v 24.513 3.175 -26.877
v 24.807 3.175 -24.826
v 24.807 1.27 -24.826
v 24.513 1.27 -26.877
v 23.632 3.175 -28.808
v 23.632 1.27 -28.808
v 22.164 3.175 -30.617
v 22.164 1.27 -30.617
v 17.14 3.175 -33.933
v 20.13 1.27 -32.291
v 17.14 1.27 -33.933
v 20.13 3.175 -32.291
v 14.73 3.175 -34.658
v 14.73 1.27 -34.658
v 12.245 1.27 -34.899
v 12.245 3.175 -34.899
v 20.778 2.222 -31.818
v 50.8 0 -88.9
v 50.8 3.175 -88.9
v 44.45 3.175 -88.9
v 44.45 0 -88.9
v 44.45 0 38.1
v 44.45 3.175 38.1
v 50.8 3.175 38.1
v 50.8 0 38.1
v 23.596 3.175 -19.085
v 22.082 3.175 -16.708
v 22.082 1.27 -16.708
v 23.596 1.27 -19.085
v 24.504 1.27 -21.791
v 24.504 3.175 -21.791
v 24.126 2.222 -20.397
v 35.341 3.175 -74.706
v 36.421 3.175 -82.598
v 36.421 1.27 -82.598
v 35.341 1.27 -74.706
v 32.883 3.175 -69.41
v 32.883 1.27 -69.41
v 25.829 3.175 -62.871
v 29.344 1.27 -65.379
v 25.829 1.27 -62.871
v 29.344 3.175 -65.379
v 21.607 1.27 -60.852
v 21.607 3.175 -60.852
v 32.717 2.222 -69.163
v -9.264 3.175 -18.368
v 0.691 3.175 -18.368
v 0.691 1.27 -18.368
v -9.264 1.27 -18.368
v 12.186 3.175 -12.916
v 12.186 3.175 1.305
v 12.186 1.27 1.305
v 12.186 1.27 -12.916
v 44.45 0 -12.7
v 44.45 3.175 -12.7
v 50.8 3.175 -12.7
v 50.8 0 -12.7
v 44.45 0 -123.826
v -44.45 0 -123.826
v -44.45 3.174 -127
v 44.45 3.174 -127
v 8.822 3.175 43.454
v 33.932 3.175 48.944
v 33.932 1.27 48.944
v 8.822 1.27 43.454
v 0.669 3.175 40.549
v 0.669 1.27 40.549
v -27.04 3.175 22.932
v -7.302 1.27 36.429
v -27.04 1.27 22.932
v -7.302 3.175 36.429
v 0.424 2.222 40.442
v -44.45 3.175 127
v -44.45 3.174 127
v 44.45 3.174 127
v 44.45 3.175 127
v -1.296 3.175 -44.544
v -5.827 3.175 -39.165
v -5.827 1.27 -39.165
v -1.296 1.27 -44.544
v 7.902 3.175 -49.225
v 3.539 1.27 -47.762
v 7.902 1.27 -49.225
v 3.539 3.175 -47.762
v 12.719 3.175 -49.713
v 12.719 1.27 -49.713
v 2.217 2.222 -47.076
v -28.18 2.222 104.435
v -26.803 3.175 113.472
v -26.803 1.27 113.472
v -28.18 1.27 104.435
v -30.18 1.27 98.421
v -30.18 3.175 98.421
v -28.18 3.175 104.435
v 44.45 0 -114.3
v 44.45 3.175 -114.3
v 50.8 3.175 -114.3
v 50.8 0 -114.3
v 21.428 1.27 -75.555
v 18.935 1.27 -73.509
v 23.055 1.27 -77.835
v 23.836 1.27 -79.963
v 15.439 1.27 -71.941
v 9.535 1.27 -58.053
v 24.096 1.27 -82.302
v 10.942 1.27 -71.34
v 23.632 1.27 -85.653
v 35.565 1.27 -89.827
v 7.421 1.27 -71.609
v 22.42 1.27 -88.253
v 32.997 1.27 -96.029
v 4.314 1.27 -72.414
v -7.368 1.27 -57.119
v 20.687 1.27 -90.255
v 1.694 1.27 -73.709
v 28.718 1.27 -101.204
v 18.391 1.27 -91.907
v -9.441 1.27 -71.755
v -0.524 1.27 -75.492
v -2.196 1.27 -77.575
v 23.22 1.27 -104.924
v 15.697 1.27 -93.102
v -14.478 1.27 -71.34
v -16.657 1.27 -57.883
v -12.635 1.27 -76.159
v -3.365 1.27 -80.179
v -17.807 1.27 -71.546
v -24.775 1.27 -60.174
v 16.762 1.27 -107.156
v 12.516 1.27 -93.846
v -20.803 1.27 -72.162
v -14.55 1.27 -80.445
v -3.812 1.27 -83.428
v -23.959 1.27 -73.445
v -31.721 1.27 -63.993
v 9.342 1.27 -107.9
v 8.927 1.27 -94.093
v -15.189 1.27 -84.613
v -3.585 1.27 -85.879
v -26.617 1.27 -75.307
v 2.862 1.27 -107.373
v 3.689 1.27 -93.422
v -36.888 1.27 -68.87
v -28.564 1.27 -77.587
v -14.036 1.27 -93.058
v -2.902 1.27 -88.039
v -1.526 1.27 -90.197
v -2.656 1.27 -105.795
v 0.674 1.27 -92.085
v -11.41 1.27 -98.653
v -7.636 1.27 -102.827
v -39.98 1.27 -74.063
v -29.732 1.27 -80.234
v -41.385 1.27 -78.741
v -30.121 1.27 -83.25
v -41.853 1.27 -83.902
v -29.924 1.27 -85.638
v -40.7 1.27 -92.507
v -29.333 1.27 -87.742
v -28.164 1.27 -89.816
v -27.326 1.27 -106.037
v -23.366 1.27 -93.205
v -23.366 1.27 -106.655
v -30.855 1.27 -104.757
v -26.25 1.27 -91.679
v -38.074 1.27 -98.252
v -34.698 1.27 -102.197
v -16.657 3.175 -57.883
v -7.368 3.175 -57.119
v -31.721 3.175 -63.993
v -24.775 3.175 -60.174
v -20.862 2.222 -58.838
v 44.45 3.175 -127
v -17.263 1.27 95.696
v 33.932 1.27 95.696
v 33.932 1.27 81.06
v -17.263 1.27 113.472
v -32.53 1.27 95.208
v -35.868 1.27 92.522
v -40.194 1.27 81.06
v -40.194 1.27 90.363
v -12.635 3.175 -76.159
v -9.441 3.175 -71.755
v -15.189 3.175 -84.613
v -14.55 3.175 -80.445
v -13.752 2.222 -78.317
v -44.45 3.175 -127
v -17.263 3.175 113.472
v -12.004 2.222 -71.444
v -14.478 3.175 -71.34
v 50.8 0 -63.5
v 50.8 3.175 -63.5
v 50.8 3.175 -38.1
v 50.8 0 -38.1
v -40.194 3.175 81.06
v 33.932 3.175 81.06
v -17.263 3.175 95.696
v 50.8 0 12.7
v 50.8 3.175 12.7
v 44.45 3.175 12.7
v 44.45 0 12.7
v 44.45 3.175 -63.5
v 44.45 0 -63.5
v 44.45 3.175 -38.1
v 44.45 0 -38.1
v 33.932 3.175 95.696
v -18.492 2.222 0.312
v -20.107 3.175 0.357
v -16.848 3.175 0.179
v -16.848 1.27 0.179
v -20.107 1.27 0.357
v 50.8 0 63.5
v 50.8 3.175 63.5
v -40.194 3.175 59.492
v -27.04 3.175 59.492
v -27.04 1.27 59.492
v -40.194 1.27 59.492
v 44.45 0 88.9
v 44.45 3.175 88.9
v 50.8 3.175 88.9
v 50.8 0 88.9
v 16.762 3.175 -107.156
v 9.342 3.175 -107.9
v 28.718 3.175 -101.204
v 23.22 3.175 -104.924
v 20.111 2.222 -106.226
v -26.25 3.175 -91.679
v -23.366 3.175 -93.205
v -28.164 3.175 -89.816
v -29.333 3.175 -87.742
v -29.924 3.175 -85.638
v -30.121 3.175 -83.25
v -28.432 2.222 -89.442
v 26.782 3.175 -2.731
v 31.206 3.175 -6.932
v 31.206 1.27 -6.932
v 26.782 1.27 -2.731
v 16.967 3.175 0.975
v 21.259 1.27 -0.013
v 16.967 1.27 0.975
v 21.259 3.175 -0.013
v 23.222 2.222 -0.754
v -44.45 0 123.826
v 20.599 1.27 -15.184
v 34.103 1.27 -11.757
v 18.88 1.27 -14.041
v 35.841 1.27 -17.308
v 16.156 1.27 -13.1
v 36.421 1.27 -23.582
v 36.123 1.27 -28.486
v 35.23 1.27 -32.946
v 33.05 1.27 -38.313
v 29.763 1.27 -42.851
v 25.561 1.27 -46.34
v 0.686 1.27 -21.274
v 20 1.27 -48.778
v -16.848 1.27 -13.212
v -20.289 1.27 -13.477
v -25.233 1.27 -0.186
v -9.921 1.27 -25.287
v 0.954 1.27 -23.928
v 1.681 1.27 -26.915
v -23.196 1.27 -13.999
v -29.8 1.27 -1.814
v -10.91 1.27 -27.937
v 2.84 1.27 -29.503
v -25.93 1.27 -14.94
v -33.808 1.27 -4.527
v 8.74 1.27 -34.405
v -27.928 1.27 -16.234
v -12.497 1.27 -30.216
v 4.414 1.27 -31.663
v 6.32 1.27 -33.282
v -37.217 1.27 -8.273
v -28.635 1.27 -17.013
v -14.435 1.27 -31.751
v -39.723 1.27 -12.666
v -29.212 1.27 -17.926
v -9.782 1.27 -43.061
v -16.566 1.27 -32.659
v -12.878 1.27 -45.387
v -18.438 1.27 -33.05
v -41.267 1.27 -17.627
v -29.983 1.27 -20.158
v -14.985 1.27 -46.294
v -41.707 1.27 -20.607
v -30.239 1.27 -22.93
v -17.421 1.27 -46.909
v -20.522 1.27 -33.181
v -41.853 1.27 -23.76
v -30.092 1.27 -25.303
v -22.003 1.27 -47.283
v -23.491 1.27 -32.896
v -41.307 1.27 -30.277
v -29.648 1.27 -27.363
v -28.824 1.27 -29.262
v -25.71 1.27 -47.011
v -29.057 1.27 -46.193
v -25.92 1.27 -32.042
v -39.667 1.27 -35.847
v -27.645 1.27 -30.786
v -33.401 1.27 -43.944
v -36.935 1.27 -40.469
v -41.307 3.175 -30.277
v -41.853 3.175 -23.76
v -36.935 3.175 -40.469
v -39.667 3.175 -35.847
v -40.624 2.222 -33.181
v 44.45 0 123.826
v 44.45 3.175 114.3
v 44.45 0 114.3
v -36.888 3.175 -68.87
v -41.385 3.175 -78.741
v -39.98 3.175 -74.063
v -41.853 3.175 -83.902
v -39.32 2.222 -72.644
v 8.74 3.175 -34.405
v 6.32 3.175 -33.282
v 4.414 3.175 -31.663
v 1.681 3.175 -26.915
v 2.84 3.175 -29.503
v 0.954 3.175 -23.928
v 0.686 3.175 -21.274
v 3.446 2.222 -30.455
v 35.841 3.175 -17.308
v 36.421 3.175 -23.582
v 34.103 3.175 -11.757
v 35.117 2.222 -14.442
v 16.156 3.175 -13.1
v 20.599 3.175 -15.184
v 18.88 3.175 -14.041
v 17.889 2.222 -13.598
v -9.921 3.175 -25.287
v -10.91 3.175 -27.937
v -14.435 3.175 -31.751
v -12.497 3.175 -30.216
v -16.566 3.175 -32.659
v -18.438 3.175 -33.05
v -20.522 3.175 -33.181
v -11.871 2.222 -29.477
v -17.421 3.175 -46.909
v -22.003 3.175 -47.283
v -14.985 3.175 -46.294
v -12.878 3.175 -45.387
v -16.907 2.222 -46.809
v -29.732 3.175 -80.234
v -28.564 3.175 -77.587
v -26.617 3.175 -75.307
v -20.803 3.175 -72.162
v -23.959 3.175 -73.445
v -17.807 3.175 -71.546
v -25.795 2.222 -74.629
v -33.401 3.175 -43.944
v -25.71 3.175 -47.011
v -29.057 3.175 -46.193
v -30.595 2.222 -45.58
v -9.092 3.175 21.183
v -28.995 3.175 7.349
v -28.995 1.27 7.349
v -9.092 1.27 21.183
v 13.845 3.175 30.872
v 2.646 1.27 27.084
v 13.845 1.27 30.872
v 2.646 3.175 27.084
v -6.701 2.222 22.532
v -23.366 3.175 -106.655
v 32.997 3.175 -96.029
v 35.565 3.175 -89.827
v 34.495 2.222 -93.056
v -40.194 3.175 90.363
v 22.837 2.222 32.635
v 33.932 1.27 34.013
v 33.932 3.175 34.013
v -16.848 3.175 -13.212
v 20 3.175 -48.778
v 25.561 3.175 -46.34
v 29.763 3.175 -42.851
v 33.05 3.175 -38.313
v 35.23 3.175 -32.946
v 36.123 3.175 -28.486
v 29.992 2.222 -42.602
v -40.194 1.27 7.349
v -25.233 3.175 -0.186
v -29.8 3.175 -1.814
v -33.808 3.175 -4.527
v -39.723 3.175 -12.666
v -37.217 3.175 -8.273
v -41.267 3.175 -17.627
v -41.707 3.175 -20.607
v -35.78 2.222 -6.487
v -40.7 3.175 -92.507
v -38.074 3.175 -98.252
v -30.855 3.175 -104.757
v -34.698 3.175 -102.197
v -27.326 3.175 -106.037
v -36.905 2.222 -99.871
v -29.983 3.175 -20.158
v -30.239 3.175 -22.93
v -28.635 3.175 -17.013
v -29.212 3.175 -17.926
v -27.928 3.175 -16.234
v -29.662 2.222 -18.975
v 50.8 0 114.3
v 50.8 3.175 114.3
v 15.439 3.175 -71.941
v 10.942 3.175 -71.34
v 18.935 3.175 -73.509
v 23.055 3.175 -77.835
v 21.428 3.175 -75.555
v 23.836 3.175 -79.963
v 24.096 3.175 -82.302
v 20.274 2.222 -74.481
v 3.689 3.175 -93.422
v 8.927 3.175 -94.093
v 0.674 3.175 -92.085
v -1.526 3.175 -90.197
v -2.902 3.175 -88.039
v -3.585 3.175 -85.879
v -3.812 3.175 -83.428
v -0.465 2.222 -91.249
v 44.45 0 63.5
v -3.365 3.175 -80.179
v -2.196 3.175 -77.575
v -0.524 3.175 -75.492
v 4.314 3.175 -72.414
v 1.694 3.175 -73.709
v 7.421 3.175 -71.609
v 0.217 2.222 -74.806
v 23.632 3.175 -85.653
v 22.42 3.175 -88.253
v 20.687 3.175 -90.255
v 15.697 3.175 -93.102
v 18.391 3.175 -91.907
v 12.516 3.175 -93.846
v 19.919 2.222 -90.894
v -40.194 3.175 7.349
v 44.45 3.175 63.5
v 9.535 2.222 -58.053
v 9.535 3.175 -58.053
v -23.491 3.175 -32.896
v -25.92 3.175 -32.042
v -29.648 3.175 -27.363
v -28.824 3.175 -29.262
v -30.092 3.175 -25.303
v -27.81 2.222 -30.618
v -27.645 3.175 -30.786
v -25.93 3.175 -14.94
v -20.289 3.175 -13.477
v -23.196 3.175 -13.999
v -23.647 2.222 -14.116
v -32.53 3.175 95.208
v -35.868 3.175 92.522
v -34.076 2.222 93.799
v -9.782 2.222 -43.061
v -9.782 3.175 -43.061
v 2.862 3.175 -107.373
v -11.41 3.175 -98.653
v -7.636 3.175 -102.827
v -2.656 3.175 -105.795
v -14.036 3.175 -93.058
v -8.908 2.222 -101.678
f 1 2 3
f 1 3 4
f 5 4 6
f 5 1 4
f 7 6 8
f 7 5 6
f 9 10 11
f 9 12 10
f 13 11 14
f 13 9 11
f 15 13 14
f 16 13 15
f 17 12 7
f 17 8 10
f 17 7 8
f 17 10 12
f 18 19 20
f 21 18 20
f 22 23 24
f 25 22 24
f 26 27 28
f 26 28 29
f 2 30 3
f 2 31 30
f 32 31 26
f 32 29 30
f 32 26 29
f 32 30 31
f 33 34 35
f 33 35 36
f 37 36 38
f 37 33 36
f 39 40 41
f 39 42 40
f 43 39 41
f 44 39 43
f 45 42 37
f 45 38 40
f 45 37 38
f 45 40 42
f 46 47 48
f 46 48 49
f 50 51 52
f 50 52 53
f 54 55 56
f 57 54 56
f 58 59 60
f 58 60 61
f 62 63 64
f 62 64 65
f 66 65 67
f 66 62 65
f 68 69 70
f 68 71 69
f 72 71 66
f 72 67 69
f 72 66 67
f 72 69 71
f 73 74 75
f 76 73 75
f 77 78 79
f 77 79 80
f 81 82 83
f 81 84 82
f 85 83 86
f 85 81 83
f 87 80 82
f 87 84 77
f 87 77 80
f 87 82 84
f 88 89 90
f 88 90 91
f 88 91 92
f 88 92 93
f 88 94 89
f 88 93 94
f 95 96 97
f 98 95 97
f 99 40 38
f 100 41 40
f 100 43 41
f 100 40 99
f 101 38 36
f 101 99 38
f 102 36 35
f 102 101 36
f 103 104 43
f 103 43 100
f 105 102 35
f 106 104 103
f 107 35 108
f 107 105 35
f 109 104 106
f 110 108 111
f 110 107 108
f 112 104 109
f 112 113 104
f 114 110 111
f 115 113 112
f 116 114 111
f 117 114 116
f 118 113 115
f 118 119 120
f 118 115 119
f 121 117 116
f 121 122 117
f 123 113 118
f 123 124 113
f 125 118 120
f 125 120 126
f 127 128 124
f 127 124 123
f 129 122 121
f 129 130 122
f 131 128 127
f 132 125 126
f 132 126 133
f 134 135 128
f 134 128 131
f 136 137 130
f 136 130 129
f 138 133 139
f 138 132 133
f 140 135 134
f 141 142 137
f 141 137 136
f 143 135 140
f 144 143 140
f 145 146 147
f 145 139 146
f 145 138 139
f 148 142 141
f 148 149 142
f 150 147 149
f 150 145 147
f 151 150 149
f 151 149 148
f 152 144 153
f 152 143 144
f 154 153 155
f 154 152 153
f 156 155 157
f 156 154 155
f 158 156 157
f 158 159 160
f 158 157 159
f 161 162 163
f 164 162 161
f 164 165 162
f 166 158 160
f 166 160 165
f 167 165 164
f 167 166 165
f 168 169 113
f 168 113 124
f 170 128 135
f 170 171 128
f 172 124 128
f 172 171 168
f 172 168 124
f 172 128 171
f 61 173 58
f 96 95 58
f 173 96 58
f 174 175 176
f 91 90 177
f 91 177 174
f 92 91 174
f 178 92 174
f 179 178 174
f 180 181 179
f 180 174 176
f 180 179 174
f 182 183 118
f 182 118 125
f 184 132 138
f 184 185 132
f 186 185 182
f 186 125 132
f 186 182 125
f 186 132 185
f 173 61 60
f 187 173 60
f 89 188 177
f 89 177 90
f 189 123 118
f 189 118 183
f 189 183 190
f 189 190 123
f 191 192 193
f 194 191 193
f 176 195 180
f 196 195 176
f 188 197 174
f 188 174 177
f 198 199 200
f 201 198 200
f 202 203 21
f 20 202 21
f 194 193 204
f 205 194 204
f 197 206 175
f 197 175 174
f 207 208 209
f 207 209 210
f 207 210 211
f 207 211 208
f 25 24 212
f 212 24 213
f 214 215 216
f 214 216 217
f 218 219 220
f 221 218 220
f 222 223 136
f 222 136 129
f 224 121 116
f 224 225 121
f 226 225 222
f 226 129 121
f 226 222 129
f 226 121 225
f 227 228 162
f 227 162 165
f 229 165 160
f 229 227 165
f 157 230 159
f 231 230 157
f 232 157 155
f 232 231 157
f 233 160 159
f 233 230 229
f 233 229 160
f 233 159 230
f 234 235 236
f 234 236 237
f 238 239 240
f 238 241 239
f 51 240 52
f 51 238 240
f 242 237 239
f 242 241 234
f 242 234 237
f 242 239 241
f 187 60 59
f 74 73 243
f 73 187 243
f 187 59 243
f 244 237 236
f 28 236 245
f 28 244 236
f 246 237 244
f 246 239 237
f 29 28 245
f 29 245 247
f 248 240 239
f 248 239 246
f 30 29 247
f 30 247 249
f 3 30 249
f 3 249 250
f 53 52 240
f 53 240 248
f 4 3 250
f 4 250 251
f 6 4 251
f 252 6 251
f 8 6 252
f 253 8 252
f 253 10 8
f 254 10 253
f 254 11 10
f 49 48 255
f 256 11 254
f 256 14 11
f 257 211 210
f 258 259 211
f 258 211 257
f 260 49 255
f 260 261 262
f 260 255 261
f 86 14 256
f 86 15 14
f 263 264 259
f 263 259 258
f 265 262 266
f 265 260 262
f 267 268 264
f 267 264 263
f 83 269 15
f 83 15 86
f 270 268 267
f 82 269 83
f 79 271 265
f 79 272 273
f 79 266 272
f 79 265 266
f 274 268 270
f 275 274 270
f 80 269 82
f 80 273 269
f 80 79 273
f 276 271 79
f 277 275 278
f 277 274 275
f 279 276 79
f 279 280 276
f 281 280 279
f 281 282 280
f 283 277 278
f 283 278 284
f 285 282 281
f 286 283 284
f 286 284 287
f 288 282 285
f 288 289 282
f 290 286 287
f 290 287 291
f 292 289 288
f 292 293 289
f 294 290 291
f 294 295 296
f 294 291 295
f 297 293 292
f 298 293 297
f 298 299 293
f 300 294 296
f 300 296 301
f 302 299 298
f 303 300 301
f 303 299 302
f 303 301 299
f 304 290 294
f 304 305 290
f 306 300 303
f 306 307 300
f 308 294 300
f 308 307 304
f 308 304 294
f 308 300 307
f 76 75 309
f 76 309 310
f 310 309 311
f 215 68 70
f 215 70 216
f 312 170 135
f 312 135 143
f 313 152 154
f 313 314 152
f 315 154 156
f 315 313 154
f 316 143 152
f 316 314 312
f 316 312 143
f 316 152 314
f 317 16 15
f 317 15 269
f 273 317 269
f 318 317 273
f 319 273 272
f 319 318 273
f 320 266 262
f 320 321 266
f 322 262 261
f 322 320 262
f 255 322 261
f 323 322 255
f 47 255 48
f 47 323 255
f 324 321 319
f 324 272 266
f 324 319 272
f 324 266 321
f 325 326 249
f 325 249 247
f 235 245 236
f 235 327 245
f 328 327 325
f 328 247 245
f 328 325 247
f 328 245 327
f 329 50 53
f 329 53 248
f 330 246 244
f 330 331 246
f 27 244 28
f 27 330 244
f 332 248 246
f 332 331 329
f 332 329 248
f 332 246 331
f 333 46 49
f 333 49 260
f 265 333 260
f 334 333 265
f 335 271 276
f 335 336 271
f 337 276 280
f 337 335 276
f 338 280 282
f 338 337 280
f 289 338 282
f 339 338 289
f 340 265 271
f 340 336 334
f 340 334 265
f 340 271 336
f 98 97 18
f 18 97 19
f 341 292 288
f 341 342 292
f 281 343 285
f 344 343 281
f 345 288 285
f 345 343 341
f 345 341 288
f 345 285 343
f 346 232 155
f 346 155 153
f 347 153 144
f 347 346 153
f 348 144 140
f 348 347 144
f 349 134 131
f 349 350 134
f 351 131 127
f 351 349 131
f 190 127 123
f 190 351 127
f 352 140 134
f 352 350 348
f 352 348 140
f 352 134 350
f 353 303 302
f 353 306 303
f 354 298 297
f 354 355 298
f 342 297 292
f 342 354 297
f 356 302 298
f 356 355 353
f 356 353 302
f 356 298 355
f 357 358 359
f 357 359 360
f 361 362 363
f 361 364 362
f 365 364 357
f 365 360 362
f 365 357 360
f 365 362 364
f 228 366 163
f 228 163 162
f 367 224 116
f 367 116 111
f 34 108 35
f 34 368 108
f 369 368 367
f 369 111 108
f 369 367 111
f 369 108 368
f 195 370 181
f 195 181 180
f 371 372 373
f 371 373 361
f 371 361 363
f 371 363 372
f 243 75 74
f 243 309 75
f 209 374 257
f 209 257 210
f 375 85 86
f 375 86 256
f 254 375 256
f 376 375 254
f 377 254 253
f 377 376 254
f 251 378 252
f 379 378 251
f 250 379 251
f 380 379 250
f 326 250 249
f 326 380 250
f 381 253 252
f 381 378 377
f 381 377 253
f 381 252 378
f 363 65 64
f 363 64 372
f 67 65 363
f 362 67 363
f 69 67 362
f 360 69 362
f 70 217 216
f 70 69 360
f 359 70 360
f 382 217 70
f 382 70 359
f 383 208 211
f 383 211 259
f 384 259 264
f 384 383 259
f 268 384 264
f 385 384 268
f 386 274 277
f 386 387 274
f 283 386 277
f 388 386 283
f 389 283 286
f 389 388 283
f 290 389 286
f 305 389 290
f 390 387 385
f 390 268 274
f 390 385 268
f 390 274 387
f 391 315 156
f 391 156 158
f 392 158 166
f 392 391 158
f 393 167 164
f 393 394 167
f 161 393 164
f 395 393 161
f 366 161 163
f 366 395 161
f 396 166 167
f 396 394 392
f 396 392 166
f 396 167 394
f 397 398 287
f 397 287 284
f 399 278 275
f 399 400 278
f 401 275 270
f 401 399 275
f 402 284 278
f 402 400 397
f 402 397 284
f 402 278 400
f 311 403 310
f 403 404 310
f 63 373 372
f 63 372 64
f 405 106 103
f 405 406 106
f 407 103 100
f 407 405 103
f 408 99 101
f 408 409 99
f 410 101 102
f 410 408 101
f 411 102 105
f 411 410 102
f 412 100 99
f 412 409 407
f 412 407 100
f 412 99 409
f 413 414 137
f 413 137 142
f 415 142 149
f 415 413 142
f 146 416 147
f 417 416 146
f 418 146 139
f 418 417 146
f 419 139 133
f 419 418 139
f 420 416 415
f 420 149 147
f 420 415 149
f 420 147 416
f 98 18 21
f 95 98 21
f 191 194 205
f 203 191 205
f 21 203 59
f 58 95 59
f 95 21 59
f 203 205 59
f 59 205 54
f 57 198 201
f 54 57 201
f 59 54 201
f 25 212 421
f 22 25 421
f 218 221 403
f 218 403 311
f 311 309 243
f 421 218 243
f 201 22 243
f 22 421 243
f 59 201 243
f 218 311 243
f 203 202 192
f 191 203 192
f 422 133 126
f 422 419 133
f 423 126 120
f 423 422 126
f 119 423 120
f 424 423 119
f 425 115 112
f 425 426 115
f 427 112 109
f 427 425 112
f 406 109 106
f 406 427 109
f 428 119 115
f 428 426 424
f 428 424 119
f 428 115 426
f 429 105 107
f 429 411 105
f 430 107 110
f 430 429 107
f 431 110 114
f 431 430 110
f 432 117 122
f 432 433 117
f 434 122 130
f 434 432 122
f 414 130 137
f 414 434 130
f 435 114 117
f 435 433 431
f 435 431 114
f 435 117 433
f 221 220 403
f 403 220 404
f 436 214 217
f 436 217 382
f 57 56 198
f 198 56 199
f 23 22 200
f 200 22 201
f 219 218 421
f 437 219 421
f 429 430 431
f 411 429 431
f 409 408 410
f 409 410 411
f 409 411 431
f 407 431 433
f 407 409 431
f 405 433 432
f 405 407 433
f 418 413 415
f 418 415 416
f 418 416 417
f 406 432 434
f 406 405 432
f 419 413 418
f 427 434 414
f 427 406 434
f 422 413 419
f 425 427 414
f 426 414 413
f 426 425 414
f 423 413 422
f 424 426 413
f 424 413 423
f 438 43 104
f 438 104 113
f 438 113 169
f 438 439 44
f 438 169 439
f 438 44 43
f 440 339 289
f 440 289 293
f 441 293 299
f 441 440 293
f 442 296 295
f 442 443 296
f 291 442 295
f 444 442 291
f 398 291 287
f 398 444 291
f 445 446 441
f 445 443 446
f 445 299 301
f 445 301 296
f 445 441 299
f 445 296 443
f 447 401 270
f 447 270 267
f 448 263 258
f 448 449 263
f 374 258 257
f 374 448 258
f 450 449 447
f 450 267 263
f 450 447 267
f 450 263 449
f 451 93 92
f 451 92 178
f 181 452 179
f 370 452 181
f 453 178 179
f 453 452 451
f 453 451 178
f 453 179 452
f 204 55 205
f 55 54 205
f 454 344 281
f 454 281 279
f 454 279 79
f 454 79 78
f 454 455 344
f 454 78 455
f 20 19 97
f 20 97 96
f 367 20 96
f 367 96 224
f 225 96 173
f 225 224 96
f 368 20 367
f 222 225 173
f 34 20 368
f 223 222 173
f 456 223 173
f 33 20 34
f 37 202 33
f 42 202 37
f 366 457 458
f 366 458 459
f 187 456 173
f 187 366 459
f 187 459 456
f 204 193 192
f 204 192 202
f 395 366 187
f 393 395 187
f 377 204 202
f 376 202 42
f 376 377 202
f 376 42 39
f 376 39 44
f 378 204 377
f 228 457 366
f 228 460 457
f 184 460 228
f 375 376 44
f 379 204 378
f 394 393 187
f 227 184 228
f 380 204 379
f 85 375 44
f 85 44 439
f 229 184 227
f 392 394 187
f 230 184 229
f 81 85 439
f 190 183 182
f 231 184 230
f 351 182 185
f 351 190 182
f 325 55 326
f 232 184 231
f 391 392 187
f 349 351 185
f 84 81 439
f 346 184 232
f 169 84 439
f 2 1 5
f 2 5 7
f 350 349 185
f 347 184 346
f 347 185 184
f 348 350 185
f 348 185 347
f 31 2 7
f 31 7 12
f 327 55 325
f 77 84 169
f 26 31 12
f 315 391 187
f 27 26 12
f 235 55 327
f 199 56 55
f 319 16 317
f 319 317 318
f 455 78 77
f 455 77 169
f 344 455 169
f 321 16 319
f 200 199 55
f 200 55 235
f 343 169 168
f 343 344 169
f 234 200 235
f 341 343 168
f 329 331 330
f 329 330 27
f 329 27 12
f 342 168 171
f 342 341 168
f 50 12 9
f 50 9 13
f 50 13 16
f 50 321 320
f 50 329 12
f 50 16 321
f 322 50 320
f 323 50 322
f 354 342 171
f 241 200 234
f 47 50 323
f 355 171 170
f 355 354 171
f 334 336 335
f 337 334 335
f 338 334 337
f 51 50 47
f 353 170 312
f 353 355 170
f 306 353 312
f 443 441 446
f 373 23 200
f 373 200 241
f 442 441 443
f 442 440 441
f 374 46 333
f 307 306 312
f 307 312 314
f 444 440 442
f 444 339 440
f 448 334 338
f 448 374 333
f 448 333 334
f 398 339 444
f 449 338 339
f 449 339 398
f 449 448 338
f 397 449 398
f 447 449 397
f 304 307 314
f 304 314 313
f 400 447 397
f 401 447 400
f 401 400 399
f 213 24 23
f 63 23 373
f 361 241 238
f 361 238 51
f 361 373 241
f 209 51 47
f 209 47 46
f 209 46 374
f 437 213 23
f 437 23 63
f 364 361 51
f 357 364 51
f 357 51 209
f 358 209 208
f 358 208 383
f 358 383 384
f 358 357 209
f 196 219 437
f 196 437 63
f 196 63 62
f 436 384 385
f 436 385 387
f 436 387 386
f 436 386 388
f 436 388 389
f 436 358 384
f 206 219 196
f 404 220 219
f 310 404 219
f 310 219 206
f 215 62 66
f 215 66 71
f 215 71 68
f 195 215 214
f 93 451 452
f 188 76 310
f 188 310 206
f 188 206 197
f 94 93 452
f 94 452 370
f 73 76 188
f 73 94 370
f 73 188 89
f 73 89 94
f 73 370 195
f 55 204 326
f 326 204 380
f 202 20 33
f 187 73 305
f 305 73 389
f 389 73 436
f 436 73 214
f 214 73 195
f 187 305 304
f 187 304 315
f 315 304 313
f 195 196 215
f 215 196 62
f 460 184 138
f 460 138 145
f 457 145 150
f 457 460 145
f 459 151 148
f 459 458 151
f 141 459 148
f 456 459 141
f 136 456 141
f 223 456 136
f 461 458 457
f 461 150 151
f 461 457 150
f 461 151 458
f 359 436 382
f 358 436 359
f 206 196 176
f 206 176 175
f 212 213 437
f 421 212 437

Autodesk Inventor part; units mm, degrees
ref_plane "YZ Plane" through (0, 0, 0) normal (1, 0, 0) x (0, 1, 0)
ref_plane "XZ Plane" through (0, 0, 0) normal (0, 1, 0) x (-1, 0, 0)
ref_plane "XY Plane" through (0, 0, 0) normal (0, 0, 1) x (1, 0, 0)
sketch "Sketch1" plane through (0, 0, 0) normal (0, 1, 0) x (-1, 0, 0)
  line L0 (44.45, 127) -> (-44.45, 127)
  line L1 (-44.45, 127) -> (-44.45, -127)
  line L2 (-44.45, -127) -> (44.45, -127)
  line L3 (44.45, -127) -> (44.45, 127)
  point P0 (0, 0)
  dimension "d0" = 88.9
  dimension "d1" = 254
extrude "Extrusion1" add sketch "Sketch1" along normal blind 3.175
sketch "Sketch3" plane through (0, 3.175, 0) normal (0, 1, 0) x (1, 0, 0)
  line L0 (50.8, -114.3) -> (44.45, -114.3)
  line L1 (44.45, -114.3) -> (44.45, -88.9)
  line L2 (44.45, -88.9) -> (50.8, -88.9)
  line L3 (50.8, -88.9) -> (50.8, -114.3)
  line L4 (50.8, -63.5) -> (44.45, -63.5)
  line L5 (44.45, -63.5) -> (44.45, -38.1)
  line L6 (44.45, -38.1) -> (50.8, -38.1)
  line L7 (50.8, -38.1) -> (50.8, -63.5)
  line L8 (50.8, -12.7) -> (44.45, -12.7)
  line L9 (44.45, -12.7) -> (44.45, 12.7)
  line L10 (44.45, 12.7) -> (50.8, 12.7)
  line L11 (50.8, 12.7) -> (50.8, -12.7)
  line L12 (50.8, 38.1) -> (44.45, 38.1)
  line L13 (44.45, 38.1) -> (44.45, 63.5)
  line L14 (44.45, 63.5) -> (50.8, 63.5)
  line L15 (50.8, 63.5) -> (50.8, 38.1)
  line L16 (50.8, 88.9) -> (44.45, 88.9)
  line L17 (44.45, 88.9) -> (44.45, 114.3)
  line L18 (44.45, 114.3) -> (50.8, 114.3)
  line L19 (50.8, 114.3) -> (50.8, 88.9)
  point P0 (0, 0)
  dimension "d6" = 50.8
extrude "Extrusion2" add sketch "Sketch3" against normal blind 3.175
sketch "Sketch4" plane through (44.042, 3.175, 128.8813) normal (0, 1, 0) x (0, 0, -1)
  line L0 (8.2401, 85.8951) -> (239.8135, 85.8951) construction
  line L1 (239.8135, 85.8951) -> (239.8135, 3.5919) construction
  line L2 (239.8135, 3.5919) -> (8.2401, 3.5919) construction
  line L3 (8.2401, 3.5919) -> (8.2401, 85.8951) construction
  line L4 (47.8214, 10.1099) -> (33.1858, 10.1099)
  line L5 (33.1858, 10.1099) -> (33.1858, 61.3049)
  line L6 (33.1858, 61.3049) -> (15.4097, 61.3049)
  line L7 (15.4097, 61.3049) -> (15.4097, 70.8447)
  spline S0 degree 2 poles (15.4097, 70.8447) (25.9569, 71.9112) (30.4601, 74.2221) knots 0 0 0 1 1 1
  spline S1 degree 2 poles (30.4601, 74.2221) (35.6744, 77.007) (38.5186, 84.236) knots 0 0 0 1 1 1
  line L8 (38.5186, 84.236) -> (47.8214, 84.236)
  line L9 (47.8214, 84.236) -> (47.8214, 10.1099)
  spline S2 degree 2 poles (121.5327, 73.0371) (102.9271, 49.8689) (98.0091, 30.1968) knots 0 0 0 1 1 1
  spline S3 degree 2 poles (98.0091, 30.1968) (96.0537, 22.2568) (94.8687, 10.1099) knots 0 0 0 1 1 1
  line L10 (94.8687, 10.1099) -> (79.9368, 10.1099)
  spline S4 degree 2 poles (79.9368, 10.1099) (83.7883, 33.1002) (93.0911, 54.1352) (105.9491, 71.0817) knots 0 0 0 1 2 2 2
  line L11 (105.9491, 71.0817) -> (69.3897, 71.0817)
  line L12 (69.3897, 71.0817) -> (69.3897, 84.236)
  line L13 (69.3897, 84.236) -> (121.5327, 84.236)
  line L14 (121.5327, 84.236) -> (121.5327, 73.0371)
  spline S5 degree 2 poles (178.5939, 31.3226) (178.5939, 20.4792) (164.373, 7.6212) (152.4631, 7.6212) knots 0 0 0 1 2 2 2
  spline S6 degree 2 poles (152.4631, 7.6212) (142.5085, 7.6212) (135.8128, 12.8355) knots 0 0 0 1 1 1
  spline S7 degree 2 poles (135.8128, 12.8355) (127.5766, 19.2941) (127.5766, 31.8559) knots 0 0 0 1 1 1
  line L15 (127.5766, 31.8559) -> (141.7974, 31.8559)
  spline S8 degree 2 poles (141.7974, 31.8559) (141.2642, 25.3973) (145.5897, 21.9605) knots 0 0 0 1 1 1
  spline S9 degree 2 poles (145.5897, 21.9605) (148.9079, 19.2349) (153.7074, 19.2349) knots 0 0 0 1 1 1
  spline S10 degree 2 poles (153.7074, 19.2349) (157.6181, 19.2349) (163.7805, 27.2934) (163.7805, 31.7966) knots 0 0 0 1 2 2 2
  spline S11 degree 2 poles (163.7805, 31.7966) (163.7805, 37.485) (154.8925, 43.7066) (147.2488, 43.3511) knots 0 0 0 1 2 2 2
  line L16 (147.2488, 43.3511) -> (147.2488, 53.3057)
  spline S12 degree 2 poles (147.2488, 53.3057) (162.0621, 52.8909) (162.0621, 64.5638) knots 0 0 0 1 1 1
  spline S13 degree 2 poles (162.0621, 64.5638) (162.0621, 74.2814) (151.8113, 74.2814) knots 0 0 0 1 1 1
  spline S14 degree 2 poles (151.8113, 74.2814) (147.2488, 74.2814) (145.1156, 71.9705) knots 0 0 0 1 1 1
  spline S15 degree 2 poles (145.1156, 71.9705) (142.39, 68.9486) (142.0937, 60.8901) knots 0 0 0 1 1 1
  line L17 (142.0937, 60.8901) -> (128.7024, 60.8901)
  spline S16 degree 2 poles (128.7024, 60.8901) (128.5247, 62.5492) (128.5247, 64.149) knots 0 0 0 1 1 1
  spline S17 degree 2 poles (128.5247, 64.149) (128.5247, 73.7481) (142.2122, 85.8951) (152.6408, 85.8951) knots 0 0 0 1 2 2 2
  spline S18 degree 2 poles (152.6408, 85.8951) (163.1287, 85.8951) (169.3503, 80.977) knots 0 0 0 1 1 1
  spline S19 degree 2 poles (169.3503, 80.977) (176.1645, 75.7627) (176.1645, 66.0452) knots 0 0 0 1 1 1
  spline S20 degree 2 poles (176.1645, 66.0452) (176.1645, 60.4161) (174.2684, 56.9201) knots 0 0 0 1 1 1
  spline S21 degree 2 poles (174.2684, 56.9201) (172.7278, 54.2537) (168.0467, 49.8689) knots 0 0 0 1 1 1
  spline S22 degree 2 poles (168.0467, 49.8689) (178.5939, 43.0548) (178.5939, 31.3226) knots 0 0 0 1 1 1
  spline S23 degree 2 poles (236.7808, 34.7001) (236.7808, 22.8494) (230.0852, 15.3242) knots 0 0 0 1 1 1
  spline S24 degree 2 poles (230.0852, 15.3242) (223.0932, 7.6212) (211.4796, 7.6212) knots 0 0 0 1 1 1
  spline S25 degree 2 poles (211.4796, 7.6212) (195.4811, 7.6212) (189.7335, 22.4346) knots 0 0 0 1 1 1
  spline S26 degree 2 poles (189.7335, 22.4346) (186.0006, 32.0929) (186.0006, 51.4095) knots 0 0 0 1 1 1
  spline S27 degree 2 poles (186.0006, 51.4095) (186.0006, 66.2229) (192.874, 75.7627) knots 0 0 0 1 1 1
  spline S28 degree 2 poles (192.874, 75.7627) (200.2214, 85.8951) (212.7831, 85.8951) knots 0 0 0 1 1 1
  spline S29 degree 2 poles (212.7831, 85.8951) (222.56, 85.8951) (234.9439, 75.9997) (235.5365, 67.408) knots 0 0 0 1 2 2 2
  line L18 (235.5365, 67.408) -> (222.0859, 67.408)
  spline S30 degree 2 poles (222.0859, 67.408) (219.538, 74.1629) (212.1313, 74.1629) knots 0 0 0 1 1 1
  spline S31 degree 2 poles (212.1313, 74.1629) (206.7985, 74.1629) (200.2214, 65.5119) (200.2214, 58.52) knots 0 0 0 1 2 2 2
  spline S32 degree 2 poles (200.2214, 58.52) (200.2214, 56.0906) (200.6362, 53.4834) knots 0 0 0 1 1 1
  spline S33 degree 2 poles (200.6362, 53.4834) (207.3318, 59.231) (213.4942, 59.231) knots 0 0 0 1 1 1
  spline S34 degree 2 poles (213.4942, 59.231) (224.3376, 59.231) (236.7808, 46.6693) (236.7808, 34.7001) knots 0 0 0 1 2 2 2
  spline S35 degree 2 poles (222.9747, 35.1148) (222.9747, 41.1587) (217.2864, 47.8543) (212.3091, 47.8543) knots 0 0 0 1 2 2 2
  spline S36 degree 2 poles (212.3091, 47.8543) (207.1541, 47.8543) (200.2214, 39.7959) (200.2214, 33.1002) knots 0 0 0 1 2 2 2
  spline S37 degree 2 poles (200.2214, 33.1002) (200.2214, 27.5896) (206.5023, 19.9459) (211.1833, 19.9459) knots 0 0 0 1 2 2 2
  spline S38 degree 2 poles (211.1833, 19.9459) (216.5754, 19.9459) (222.9747, 28.3007) (222.9747, 35.1148) knots 0 0 0 1 2 2 2
  point P0 (127, 0)
extrude "Extrusion3" cut sketch "Sketch4" against normal blind 1.905
chamfer "Chamfer1" distance 3.175 angle 45 2 edges at (0, 0, 127) (0, 0, -127)
properties part number "side"
